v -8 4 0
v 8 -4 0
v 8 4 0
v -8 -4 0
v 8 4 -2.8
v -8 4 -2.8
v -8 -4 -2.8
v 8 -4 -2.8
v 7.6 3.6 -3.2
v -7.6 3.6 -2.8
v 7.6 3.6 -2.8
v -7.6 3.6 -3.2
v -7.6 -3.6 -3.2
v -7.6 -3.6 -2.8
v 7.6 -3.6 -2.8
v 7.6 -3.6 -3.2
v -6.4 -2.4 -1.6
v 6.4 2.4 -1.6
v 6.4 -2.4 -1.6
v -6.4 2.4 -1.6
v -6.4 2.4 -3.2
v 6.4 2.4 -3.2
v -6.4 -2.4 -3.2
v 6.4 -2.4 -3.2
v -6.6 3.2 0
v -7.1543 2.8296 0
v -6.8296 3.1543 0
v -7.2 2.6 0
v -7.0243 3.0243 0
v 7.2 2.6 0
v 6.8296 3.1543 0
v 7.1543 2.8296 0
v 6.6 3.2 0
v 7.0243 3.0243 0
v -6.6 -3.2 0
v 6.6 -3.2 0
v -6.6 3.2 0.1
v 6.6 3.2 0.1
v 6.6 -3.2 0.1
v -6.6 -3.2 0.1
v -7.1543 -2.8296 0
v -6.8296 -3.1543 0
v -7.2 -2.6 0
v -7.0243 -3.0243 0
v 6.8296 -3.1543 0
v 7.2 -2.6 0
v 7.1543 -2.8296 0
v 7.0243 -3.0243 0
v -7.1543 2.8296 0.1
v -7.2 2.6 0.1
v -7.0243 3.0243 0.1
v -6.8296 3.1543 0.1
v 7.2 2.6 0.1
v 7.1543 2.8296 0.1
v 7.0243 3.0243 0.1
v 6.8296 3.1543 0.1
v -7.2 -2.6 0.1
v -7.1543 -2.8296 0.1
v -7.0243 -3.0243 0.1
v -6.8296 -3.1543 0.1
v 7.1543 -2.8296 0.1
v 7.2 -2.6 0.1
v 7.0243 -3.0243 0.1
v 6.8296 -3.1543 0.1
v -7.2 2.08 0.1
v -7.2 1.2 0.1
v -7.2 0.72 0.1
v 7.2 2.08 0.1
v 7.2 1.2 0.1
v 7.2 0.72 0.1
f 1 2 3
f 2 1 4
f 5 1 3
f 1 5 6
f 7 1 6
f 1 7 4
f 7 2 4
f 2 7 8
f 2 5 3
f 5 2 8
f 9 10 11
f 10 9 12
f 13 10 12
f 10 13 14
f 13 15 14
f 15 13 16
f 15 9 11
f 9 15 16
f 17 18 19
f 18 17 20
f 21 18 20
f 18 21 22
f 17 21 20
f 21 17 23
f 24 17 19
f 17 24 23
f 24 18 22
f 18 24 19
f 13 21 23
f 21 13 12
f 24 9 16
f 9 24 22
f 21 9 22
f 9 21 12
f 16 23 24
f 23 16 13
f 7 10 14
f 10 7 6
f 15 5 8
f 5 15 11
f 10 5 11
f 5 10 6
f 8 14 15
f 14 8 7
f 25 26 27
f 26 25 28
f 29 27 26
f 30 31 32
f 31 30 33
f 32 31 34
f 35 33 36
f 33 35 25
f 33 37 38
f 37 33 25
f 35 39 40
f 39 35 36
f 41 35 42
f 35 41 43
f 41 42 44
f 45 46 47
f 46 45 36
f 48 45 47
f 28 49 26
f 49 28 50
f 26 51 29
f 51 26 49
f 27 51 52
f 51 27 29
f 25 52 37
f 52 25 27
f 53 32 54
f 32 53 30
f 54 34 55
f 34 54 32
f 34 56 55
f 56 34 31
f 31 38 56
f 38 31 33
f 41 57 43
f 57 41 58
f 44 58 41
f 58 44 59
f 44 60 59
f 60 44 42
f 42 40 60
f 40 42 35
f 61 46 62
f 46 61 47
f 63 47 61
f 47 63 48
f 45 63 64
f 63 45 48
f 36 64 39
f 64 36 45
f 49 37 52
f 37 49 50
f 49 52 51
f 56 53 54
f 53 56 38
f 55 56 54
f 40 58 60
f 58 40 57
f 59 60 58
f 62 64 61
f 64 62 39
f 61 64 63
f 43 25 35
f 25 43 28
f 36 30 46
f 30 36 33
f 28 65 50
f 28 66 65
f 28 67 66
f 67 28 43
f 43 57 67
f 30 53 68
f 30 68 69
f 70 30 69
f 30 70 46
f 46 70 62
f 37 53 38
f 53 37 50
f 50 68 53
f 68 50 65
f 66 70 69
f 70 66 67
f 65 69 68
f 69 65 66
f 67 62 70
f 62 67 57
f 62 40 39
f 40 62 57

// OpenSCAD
// file: ../p/box5.scad
use <../lib.scad>
function ldraw_lib__box5() = [
// 0 Box with 5 Faces and All Edges
// 0 Name: box5.dat
// 0 Author: James Jessiman
// 0 !LDRAW_ORG Primitive UPDATE 2012-01
// 0 !LICENSE Licensed under CC BY 4.0 : see CAreadme.txt
// 
// 0 BFC CERTIFY CCW
  [0,"BFC","CERTIFY"],
  [0,"BFC","CCW"],
// 
// 0 !HISTORY 2002-04-03 [sbliss] Modified for BFC compliance
// 0 !HISTORY 2002-04-25 [PTadmin] Official Update 2002-02
// 0 !HISTORY 2007-06-24 [PTadmin] Header formatted for Contributor Agreement
// 0 !HISTORY 2008-07-01 [PTadmin] Official Update 2008-01
// 0 !HISTORY 2012-02-16 [Philo] Changed to CCW
// 0 !HISTORY 2012-03-30 [PTadmin] Official Update 2012-01
// 
// 
// 2 24 1 1 1 -1 1 1
  [2,24,1,1,1,-1,1,1],
// 2 24 -1 1 1 -1 1 -1
  [2,24,-1,1,1,-1,1,-1],
// 2 24 -1 1 -1 1 1 -1
  [2,24,-1,1,-1,1,1,-1],
// 2 24 1 1 -1 1 1 1
  [2,24,1,1,-1,1,1,1],
// 2 24 1 0 1 -1 0 1
  [2,24,1,0,1,-1,0,1],
// 2 24 -1 0 1 -1 0 -1
  [2,24,-1,0,1,-1,0,-1],
// 2 24 -1 0 -1 1 0 -1
  [2,24,-1,0,-1,1,0,-1],
// 2 24 1 0 -1 1 0 1
  [2,24,1,0,-1,1,0,1],
// 2 24 1 0 1 1 1 1
  [2,24,1,0,1,1,1,1],
// 2 24 -1 0 1 -1 1 1
  [2,24,-1,0,1,-1,1,1],
// 2 24 1 0 -1 1 1 -1
  [2,24,1,0,-1,1,1,-1],
// 2 24 -1 0 -1 -1 1 -1
  [2,24,-1,0,-1,-1,1,-1],
// 4 16 -1 1 1 1 1 1 1 1 -1 -1 1 -1
  [4,16,-1,1,1,1,1,1,1,1,-1,-1,1,-1],
// 4 16 -1 1 1 -1 0 1 1 0 1 1 1 1
  [4,16,-1,1,1,-1,0,1,1,0,1,1,1,1],
// 4 16 -1 1 -1 -1 0 -1 -1 0 1 -1 1 1
  [4,16,-1,1,-1,-1,0,-1,-1,0,1,-1,1,1],
// 4 16 1 1 -1 1 0 -1 -1 0 -1 -1 1 -1
  [4,16,1,1,-1,1,0,-1,-1,0,-1,-1,1,-1],
// 4 16 1 1 1 1 0 1 1 0 -1 1 1 -1
  [4,16,1,1,1,1,0,1,1,0,-1,1,1,-1],
];
module ldraw_lib__box5(step=0, col=false, unit=2/5, alt=false, line=0.2, solid=!$preview)
    makepoly(ldraw_lib__box5(), step=step, col=col, unit=unit, alt=alt, line=line, solid=solid);
ldraw_lib__box5(line=0.2);
// file: ../p/box4.scad
use <../lib.scad>
function ldraw_lib__box4() = [
// 0 Box with 4 Faces (2 Parallel Pairs) and All Edges
// 0 Name: box4.dat
// 0 Author: James Jessiman
// 0 !LDRAW_ORG Primitive UPDATE 2012-01
// 0 !LICENSE Licensed under CC BY 4.0 : see CAreadme.txt
// 
// 0 BFC CERTIFY CCW
  [0,"BFC","CERTIFY"],
  [0,"BFC","CCW"],
// 
// 0 !HISTORY 2002-04-03 [sbliss] Modified for BFC compliance
// 0 !HISTORY 2002-04-25 [PTadmin] Official Update 2002-02
// 0 !HISTORY 2007-06-24 [PTadmin] Header formatted for Contributor Agreement
// 0 !HISTORY 2008-07-01 [PTadmin] Official Update 2008-01
// 0 !HISTORY 2012-02-16 [Philo] Changed to CCW
// 0 !HISTORY 2012-03-30 [PTadmin] Official Update 2012-01
// 
// 
// 2 24 1 1 1 -1 1 1
  [2,24,1,1,1,-1,1,1],
// 2 24 -1 1 1 -1 1 -1
  [2,24,-1,1,1,-1,1,-1],
// 2 24 -1 1 -1 1 1 -1
  [2,24,-1,1,-1,1,1,-1],
// 2 24 1 1 -1 1 1 1
  [2,24,1,1,-1,1,1,1],
// 2 24 1 0 1 -1 0 1
  [2,24,1,0,1,-1,0,1],
// 2 24 -1 0 1 -1 0 -1
  [2,24,-1,0,1,-1,0,-1],
// 2 24 -1 0 -1 1 0 -1
  [2,24,-1,0,-1,1,0,-1],
// 2 24 1 0 -1 1 0 1
  [2,24,1,0,-1,1,0,1],
// 2 24 1 0 1 1 1 1
  [2,24,1,0,1,1,1,1],
// 2 24 -1 0 1 -1 1 1
  [2,24,-1,0,1,-1,1,1],
// 2 24 1 0 -1 1 1 -1
  [2,24,1,0,-1,1,1,-1],
// 2 24 -1 0 -1 -1 1 -1
  [2,24,-1,0,-1,-1,1,-1],
// 4 16 -1 1 1 -1 0 1 1 0 1 1 1 1
  [4,16,-1,1,1,-1,0,1,1,0,1,1,1,1],
// 4 16 -1 1 -1 -1 0 -1 -1 0 1 -1 1 1
  [4,16,-1,1,-1,-1,0,-1,-1,0,1,-1,1,1],
// 4 16 1 1 -1 1 0 -1 -1 0 -1 -1 1 -1
  [4,16,1,1,-1,1,0,-1,-1,0,-1,-1,1,-1],
// 4 16 1 1 1 1 0 1 1 0 -1 1 1 -1
  [4,16,1,1,1,1,0,1,1,0,-1,1,1,-1],
];
module ldraw_lib__box4(step=0, col=false, unit=2/5, alt=false, line=0.2, solid=!$preview)
    makepoly(ldraw_lib__box4(), step=step, col=col, unit=unit, alt=alt, line=line, solid=solid);
ldraw_lib__box4(line=0.2);
// file: ../p/box3u12.scad
use <../lib.scad>
function ldraw_lib__box3u12() = [
// 0 Box with 3 Parallel Faces without Any Edges
// 0 Name: box3u12.dat
// 0 Author: J.C. Tchang [tchang]
// 0 !LDRAW_ORG Primitive UPDATE 2014-02
// 0 !LICENSE Licensed under CC BY 4.0 : see CAreadme.txt
// 
// 0 BFC CERTIFY CCW
  [0,"BFC","CERTIFY"],
  [0,"BFC","CCW"],
// 
// 0 !HISTORY 2014-12-23 [PTadmin] Official Update 2014-02
// 
// 
// 4 16 -1 1 1 1 1 1 1 1 -1 -1 1 -1
  [4,16,-1,1,1,1,1,1,1,1,-1,-1,1,-1],
// 4 16 -1 1 1 -1 0 1 1 0 1 1 1 1
  [4,16,-1,1,1,-1,0,1,1,0,1,1,1,1],
// 4 16 1 1 -1 1 0 -1 -1 0 -1 -1 1 -1
  [4,16,1,1,-1,1,0,-1,-1,0,-1,-1,1,-1],
];
module ldraw_lib__box3u12(step=0, col=false, unit=2/5, alt=false, line=0.2, solid=!$preview)
    makepoly(ldraw_lib__box3u12(), step=step, col=col, unit=unit, alt=alt, line=line, solid=solid);
ldraw_lib__box3u12(line=0.2);
// file: ../p/1-4cyli.scad
use <../lib.scad>
function ldraw_lib__1_4cyli() = [
// 0 Cylinder 0.25
// 0 Name: 1-4cyli.dat
// 0 Author: James Jessiman
// 0 !LDRAW_ORG Primitive UPDATE 2012-01
// 0 !LICENSE Licensed under CC BY 4.0 : see CAreadme.txt
// 
// 0 BFC CERTIFY CCW
  [0,"BFC","CERTIFY"],
  [0,"BFC","CCW"],
// 
// 0 !HISTORY 2002-03-23 [sbliss] Added BFC statement.
// 0 !HISTORY 2002-04-25 [PTadmin] Official Update 2002-02
// 0 !HISTORY 2007-06-22 [PTadmin] Header formatted for Contributor Agreement
// 0 !HISTORY 2008-07-01 [PTadmin] Official Update 2008-01
// 0 !HISTORY 2012-02-16 [Philo] Changed to CCW
// 0 !HISTORY 2012-03-30 [PTadmin] Official Update 2012-01
// 
// 
// 4 16 1 1 0 0.9239 1 0.3827 0.9239 0 0.3827 1 0 0
  [4,16,1,1,0,0.9239,1,0.3827,0.9239,0,0.3827,1,0,0],
// 5 24 1 0 0 1 1 0 0.9239 0 0.3827 1 0 -1
  [5,24,1,0,0,1,1,0,0.9239,0,0.3827,1,0,-1],
// 4 16 0.9239 1 0.3827 0.7071 1 0.7071 0.7071 0 0.7071 0.9239 0 0.3827
  [4,16,0.9239,1,0.3827,0.7071,1,0.7071,0.7071,0,0.7071,0.9239,0,0.3827],
// 5 24 0.9239 0 0.3827 0.9239 1 0.3827 0.7071 0 0.7071 1 0 0
  [5,24,0.9239,0,0.3827,0.9239,1,0.3827,0.7071,0,0.7071,1,0,0],
// 4 16 0.7071 1 0.7071 0.3827 1 0.9239 0.3827 0 0.9239 0.7071 0 0.7071
  [4,16,0.7071,1,0.7071,0.3827,1,0.9239,0.3827,0,0.9239,0.7071,0,0.7071],
// 5 24 0.7071 0 0.7071 0.7071 1 0.7071 0.3827 0 0.9239 0.9239 0 0.3827
  [5,24,0.7071,0,0.7071,0.7071,1,0.7071,0.3827,0,0.9239,0.9239,0,0.3827],
// 4 16 0.3827 1 0.9239 0 1 1 0 0 1 0.3827 0 0.9239
  [4,16,0.3827,1,0.9239,0,1,1,0,0,1,0.3827,0,0.9239],
// 5 24 0.3827 0 0.9239 0.3827 1 0.9239 0 0 1 0.7071 0 0.7071
  [5,24,0.3827,0,0.9239,0.3827,1,0.9239,0,0,1,0.7071,0,0.7071],
// 5 24 0 0 1 0 1 1 0.3827 0 0.9239 -1 0 1
  [5,24,0,0,1,0,1,1,0.3827,0,0.9239,-1,0,1],
];
module ldraw_lib__1_4cyli(step=0, col=false, unit=2/5, alt=false, line=0.2, solid=!$preview)
    makepoly(ldraw_lib__1_4cyli(), step=step, col=col, unit=unit, alt=alt, line=line, solid=solid);
ldraw_lib__1_4cyli(line=0.2);
// file: ../p/1-4chrd.scad
use <../lib.scad>
function ldraw_lib__1_4chrd() = [
// 0 Chord 0.25
// 0 Name: 1-4chrd.dat
// 0 Author: Max Martin Richter [MMR1988]
// 0 !LDRAW_ORG Primitive UPDATE 2023-05
// 0 !LICENSE Licensed under CC BY 4.0 : see CAreadme.txt
// 
// 0 BFC CERTIFY CCW
  [0,"BFC","CERTIFY"],
  [0,"BFC","CCW"],
// 
// 0 !HISTORY 2004-04-22 [PTadmin] Official Update 2004-02
// 0 !HISTORY 2007-10-09 [PTadmin] Header formatted for Contributor Agreement
// 0 !HISTORY 2008-07-01 [PTadmin] Official Update 2008-01
// 0 !HISTORY 2012-08-02 [MMR1988] Re-creation with PrimGen2 and Rectifier
// 0 !HISTORY 2012-08-09 [PTadmin] Official Update 2012-02
// 0 !HISTORY 2023-10-27 [OrionP] Change author to MMR1988 from hafhead
// 0 !HISTORY 2023-10-31 [OrionP] Official Update 2023-05
// 
// 4 16 0.9239 0 0.3827 0.3827 0 0.9239 0 0 1 1 0 0
  [4,16,0.9239,0,0.3827,0.3827,0,0.9239,0,0,1,1,0,0],
// 3 16 0.7071 0 0.7071 0.3827 0 0.9239 0.9239 0 0.3827
  [3,16,0.7071,0,0.7071,0.3827,0,0.9239,0.9239,0,0.3827],
];
module ldraw_lib__1_4chrd(step=0, col=false, unit=2/5, alt=false, line=0.2, solid=!$preview)
    makepoly(ldraw_lib__1_4chrd(), step=step, col=col, unit=unit, alt=alt, line=line, solid=solid);
ldraw_lib__1_4chrd(line=0.2);
// file: s/3069bs01.scad
use <../../lib.scad>
use <../../p/box4.scad>
use <../../p/box5.scad>
function ldraw_lib__s__3069bs01() = [
// 0 ~Tile  1 x  2 with Groove without Top Face
// 0 Name: s\3069bs01.dat
// 0 Author: Santeri Piippo [arezey]
// 0 !LDRAW_ORG Subpart UPDATE 2010-02
// 0 !LICENSE Licensed under CC BY 4.0 : see CAreadme.txt
// 
// 0 BFC CERTIFY CCW
  [0,"BFC","CERTIFY"],
  [0,"BFC","CCW"],
// 
// 0 !HISTORY 2010-07-05 [PTadmin] Official Update 2010-02
// 
// 
// 1 16 0 0 0 20 0 0 0 7 0 0 0 10 box4.dat
  [1,16,0,0,0,20,0,0,0,7,0,0,0,10, ldraw_lib__box4()],
// 1 16 0 7 0 19 0 0 0 1 0 0 0 9 box4.dat
  [1,16,0,7,0,19,0,0,0,1,0,0,0,9, ldraw_lib__box4()],
// 0 BFC INVERTNEXT
  [0,"BFC","INVERTNEXT"],
// 1 16 0 8 0 16 0 0 0 -4 0 0 0 6 box5.dat
  [1,16,0,8,0,16,0,0,0,-4,0,0,0,6, ldraw_lib__box5()],
// 4 16 -19 8 9 -16 8 6 -16 8 -6 -19 8 -9
  [4,16,-19,8,9,-16,8,6,-16,8,-6,-19,8,-9],
// 4 16 19 8 -9 16 8 -6 16 8 6 19 8 9
  [4,16,19,8,-9,16,8,-6,16,8,6,19,8,9],
// 4 16 19 8 9 16 8 6 -16 8 6 -19 8 9
  [4,16,19,8,9,16,8,6,-16,8,6,-19,8,9],
// 4 16 -19 8 -9 -16 8 -6 16 8 -6 19 8 -9
  [4,16,-19,8,-9,-16,8,-6,16,8,-6,19,8,-9],
// 4 16 -20 7 10 -19 7 9 -19 7 -9 -20 7 -10
  [4,16,-20,7,10,-19,7,9,-19,7,-9,-20,7,-10],
// 4 16 20 7 -10 19 7 -9 19 7 9 20 7 10
  [4,16,20,7,-10,19,7,-9,19,7,9,20,7,10],
// 4 16 20 7 10 19 7 9 -19 7 9 -20 7 10
  [4,16,20,7,10,19,7,9,-19,7,9,-20,7,10],
// 4 16 -20 7 -10 -19 7 -9 19 7 -9 20 7 -10
  [4,16,-20,7,-10,-19,7,-9,19,7,-9,20,7,-10],
// 0 //
];
module ldraw_lib__s__3069bs01(step=0, col=false, unit=2/5, alt=false, line=0.2, solid=!$preview)
    makepoly(ldraw_lib__s__3069bs01(), step=step, col=col, unit=unit, alt=alt, line=line, solid=solid);
ldraw_lib__s__3069bs01(line=0.2);
// file: 6177741d.scad
use <../lib.scad>
use <../p/1-4chrd.scad>
use <../p/1-4cyli.scad>
use <../p/box3u12.scad>
function ldraw_lib__6177741d() = [
// 0 Sticker  0.8 x  1.8 with Yellow Stripes on Transparent Background
// 0 Name: 6177741d.dat
// 0 Author: Massimo Maso [Sirio]
// 0 !LDRAW_ORG Part UPDATE 2025-05
// 0 !LICENSE Licensed under CC BY 4.0 : see CAreadme.txt
// 
// 0 BFC CERTIFY CCW
  [0,"BFC","CERTIFY"],
  [0,"BFC","CCW"],
// 
// 0 !KEYWORDS AMG, GT3, Mercedes, Set 75877, Speed Champions
// 
// 0 !HISTORY 2025-05-28 [OrionP] Official Update 2025-05
// 
// 
// 0 // Primitives
// 
// 1 16 -16.5 0 6.5 -1.5 0 0 0 -1 0 0 0 1.5 1-4chrd.dat
  [1,16,-16.5,0,6.5,-1.5,0,0,0,-1,0,0,0,1.5, ldraw_lib__1_4chrd()],
// 1 16 16.5 0 6.5 1.5 0 0 0 -1 0 0 0 1.5 1-4chrd.dat
  [1,16,16.5,0,6.5,1.5,0,0,0,-1,0,0,0,1.5, ldraw_lib__1_4chrd()],
// 1 16 0 -.25 0 16.5 0 0 0 .25 0 0 0 8 box3u12.dat
  [1,16,0,-.25,0,16.5,0,0,0,.25,0,0,0,8, ldraw_lib__box3u12()],
// 1 16 -16.5 0 -6.5 -1.5 0 0 0 -1 0 0 0 -1.5 1-4chrd.dat
  [1,16,-16.5,0,-6.5,-1.5,0,0,0,-1,0,0,0,-1.5, ldraw_lib__1_4chrd()],
// 1 16 16.5 0 -6.5 1.5 0 0 0 -1 0 0 0 -1.5 1-4chrd.dat
  [1,16,16.5,0,-6.5,1.5,0,0,0,-1,0,0,0,-1.5, ldraw_lib__1_4chrd()],
// 1 16 -16.5 0 6.5 -1.5 0 0 0 -.25 0 0 0 1.5 1-4cyli.dat
  [1,16,-16.5,0,6.5,-1.5,0,0,0,-.25,0,0,0,1.5, ldraw_lib__1_4cyli()],
// 1 16 16.5 0 6.5 1.5 0 0 0 -.25 0 0 0 1.5 1-4cyli.dat
  [1,16,16.5,0,6.5,1.5,0,0,0,-.25,0,0,0,1.5, ldraw_lib__1_4cyli()],
// 1 16 -16.5 0 -6.5 -1.5 0 0 0 -.25 0 0 0 -1.5 1-4cyli.dat
  [1,16,-16.5,0,-6.5,-1.5,0,0,0,-.25,0,0,0,-1.5, ldraw_lib__1_4cyli()],
// 1 16 16.5 0 -6.5 1.5 0 0 0 -.25 0 0 0 -1.5 1-4cyli.dat
  [1,16,16.5,0,-6.5,1.5,0,0,0,-.25,0,0,0,-1.5, ldraw_lib__1_4cyli()],
// 1 16 -16.5 -.25 6.5 -1.5 0 0 0 1 0 0 0 1.5 1-4chrd.dat
  [1,16,-16.5,-.25,6.5,-1.5,0,0,0,1,0,0,0,1.5, ldraw_lib__1_4chrd()],
// 1 16 16.5 -.25 6.5 1.5 0 0 0 1 0 0 0 1.5 1-4chrd.dat
  [1,16,16.5,-.25,6.5,1.5,0,0,0,1,0,0,0,1.5, ldraw_lib__1_4chrd()],
// 0 BFC NOCLIP
  [0,"BFC","NOCLIP"],
// 1 14 -16.5 -.25 -6.5 -1.5 0 0 0 1 0 0 0 -1.5 1-4chrd.dat
  [1,14,-16.5,-.25,-6.5,-1.5,0,0,0,1,0,0,0,-1.5, ldraw_lib__1_4chrd()],
// 1 14 16.5 -.25 -6.5 1.5 0 0 0 1 0 0 0 -1.5 1-4chrd.dat
  [1,14,16.5,-.25,-6.5,1.5,0,0,0,1,0,0,0,-1.5, ldraw_lib__1_4chrd()],
// 0 BFC CLIP
  [0,"BFC","CLIP"],
// 0 // Bottom face
// 4 16 -16.5 0 8 -16.5 0 -8 -18 0 -6.5 -18 0 6.5
  [4,16,-16.5,0,8,-16.5,0,-8,-18,0,-6.5,-18,0,6.5],
// 4 16 16.5 0 8 18 0 6.5 18 0 -6.5 16.5 0 -8
  [4,16,16.5,0,8,18,0,6.5,18,0,-6.5,16.5,0,-8],
// 0 // Lateral face
// 3 16 -18 0 6.5 -18 -.25 5.2 -18 -.25 6.5
  [3,16,-18,0,6.5,-18,-.25,5.2,-18,-.25,6.5],
// 3 16 -18 0 6.5 -18 -.25 3 -18 -.25 5.2
  [3,16,-18,0,6.5,-18,-.25,3,-18,-.25,5.2],
// 4 16 -18 0 -6.5 -18 -.25 1.8 -18 -.25 3 -18 0 6.5
  [4,16,-18,0,-6.5,-18,-.25,1.8,-18,-.25,3,-18,0,6.5],
// 3 16 -18 0 -6.5 -18 -.25 -6.5 -18 -.25 1.8
  [3,16,-18,0,-6.5,-18,-.25,-6.5,-18,-.25,1.8],
// 3 16 18 0 6.5 18 -.25 6.5 18 -.25 5.2
  [3,16,18,0,6.5,18,-.25,6.5,18,-.25,5.2],
// 3 16 18 0 6.5 18 -.25 5.2 18 -.25 3
  [3,16,18,0,6.5,18,-.25,5.2,18,-.25,3],
// 4 16 18 0 -6.5 18 0 6.5 18 -.25 3 18 -.25 1.8
  [4,16,18,0,-6.5,18,0,6.5,18,-.25,3,18,-.25,1.8],
// 3 16 18 0 -6.5 18 -.25 1.8 18 -.25 -6.5
  [3,16,18,0,-6.5,18,-.25,1.8,18,-.25,-6.5],
// 0 // Top face
// 0 // Neutral faces
// 0 // First stirpe faces
// 4 16 -18 -.25 6.5 18 -.25 6.5 16.5 -.25 8 -16.5 -.25 8
  [4,16,-18,-.25,6.5,18,-.25,6.5,16.5,-.25,8,-16.5,-.25,8],
// 4 16 -18 -.25 6.5 -18 -.25 5.2 18 -.25 5.2 18 -.25 6.5
  [4,16,-18,-.25,6.5,-18,-.25,5.2,18,-.25,5.2,18,-.25,6.5],
// 0 // Second stripe faces
// 4 16 -18 -.25 3 -18 -.25 1.8 18 -.25 1.8 18 -.25 3
  [4,16,-18,-.25,3,-18,-.25,1.8,18,-.25,1.8,18,-.25,3],
// 0 BFC NOCLIP
  [0,"BFC","NOCLIP"],
// 0 // Yellow faces
// 0 // First stirpe faces
// 4 14 -18 -.25 3 18 -.25 3 18 -.25 5.2 -18 -.25 5.2
  [4,14,-18,-.25,3,18,-.25,3,18,-.25,5.2,-18,-.25,5.2],
// 0 // Second stripe faces
// 4 14 -18 -.25 -6.5 18 -.25 -6.5 18 -.25 1.8 -18 -.25 1.8
  [4,14,-18,-.25,-6.5,18,-.25,-6.5,18,-.25,1.8,-18,-.25,1.8],
// 4 14 -18 -.25 -6.5 -16.5 -.25 -8 16.5 -.25 -8 18 -.25 -6.5
  [4,14,-18,-.25,-6.5,-16.5,-.25,-8,16.5,-.25,-8,18,-.25,-6.5],
];
module ldraw_lib__6177741d(step=0, col=false, unit=2/5, alt=false, line=0.2, solid=!$preview)
    makepoly(ldraw_lib__6177741d(), step=step, col=col, unit=unit, alt=alt, line=line, solid=solid);
ldraw_lib__6177741d(line=0.2);
// file: 3069b.scad
use <../lib.scad>
use <s/3069bs01.scad>
function ldraw_lib__3069b() = [
// 0 Tile  1 x  2 with Groove
// 0 Name: 3069b.dat
// 0 Author: Santeri Piippo [arezey]
// 0 !LDRAW_ORG Part UPDATE 2010-02
// 0 !LICENSE Licensed under CC BY 4.0 : see CAreadme.txt
// 
// 0 BFC CERTIFY CCW
  [0,"BFC","CERTIFY"],
  [0,"BFC","CCW"],
// 
// 0 !KEYWORDS BrickLink 3069
// 
// 0 !HISTORY 2010-07-05 [PTadmin] Official Update 2010-02
// 
// 
// 4 16 20 0 -10 20 0 10 -20 0 10 -20 0 -10
  [4,16,20,0,-10,20,0,10,-20,0,10,-20,0,-10],
// 1 16 0 0 0 1 0 0 0 1 0 0 0 1 s\3069bs01.dat
  [1,16,0,0,0,1,0,0,0,1,0,0,0,1, ldraw_lib__s__3069bs01()],
// 0 //
];
module ldraw_lib__3069b(step=0, col=false, unit=2/5, alt=false, line=0.2, solid=!$preview)
    makepoly(ldraw_lib__3069b(), step=step, col=col, unit=unit, alt=alt, line=line, solid=solid);
ldraw_lib__3069b(line=0.2);
// main file
use <../lib.scad>
use <3069b.scad>
use <6177741d.scad>
function ldraw_lib__3069bd2j() = [
// 0 Tile  1 x  2 with Yellow Stripes on Transparent Background Sticker
// 0 Name: 3069bd2j.dat
// 0 Author: Alfred Schmitz [AlfredS]
// 0 !LDRAW_ORG Shortcut UPDATE 2026-08
// 0 !LICENSE Licensed under CC BY 4.0 : see CAreadme.txt
// 
// 0 BFC CERTIFY CCW
  [0,"BFC","CERTIFY"],
  [0,"BFC","CCW"],
// 
// 0 !CATEGORY Sticker Shortcut
// 0 !KEYWORDS AMG, GT3, Mercedes, Set 75877, Speed Champions
// 
// 0 !HISTORY 2026-08-31 [OrionP] Official Update 2026-08
// 
// 1 16 0 0 0 1 0 0 0 1 0 0 0 1 3069b.dat
  [1,16,0,0,0,1,0,0,0,1,0,0,0,1, ldraw_lib__3069b()],
// 1 16 0 0 0 1 0 0 0 1 0 0 0 1 6177741d.dat
  [1,16,0,0,0,1,0,0,0,1,0,0,0,1, ldraw_lib__6177741d()],
];
module ldraw_lib__3069bd2j(step=0, col=false, unit=2/5, alt=false, line=0.2, solid=!$preview)
    makepoly(ldraw_lib__3069bd2j(), step=step, col=col, unit=unit, alt=alt, line=line, solid=solid);
ldraw_lib__3069bd2j(line=0.2);
